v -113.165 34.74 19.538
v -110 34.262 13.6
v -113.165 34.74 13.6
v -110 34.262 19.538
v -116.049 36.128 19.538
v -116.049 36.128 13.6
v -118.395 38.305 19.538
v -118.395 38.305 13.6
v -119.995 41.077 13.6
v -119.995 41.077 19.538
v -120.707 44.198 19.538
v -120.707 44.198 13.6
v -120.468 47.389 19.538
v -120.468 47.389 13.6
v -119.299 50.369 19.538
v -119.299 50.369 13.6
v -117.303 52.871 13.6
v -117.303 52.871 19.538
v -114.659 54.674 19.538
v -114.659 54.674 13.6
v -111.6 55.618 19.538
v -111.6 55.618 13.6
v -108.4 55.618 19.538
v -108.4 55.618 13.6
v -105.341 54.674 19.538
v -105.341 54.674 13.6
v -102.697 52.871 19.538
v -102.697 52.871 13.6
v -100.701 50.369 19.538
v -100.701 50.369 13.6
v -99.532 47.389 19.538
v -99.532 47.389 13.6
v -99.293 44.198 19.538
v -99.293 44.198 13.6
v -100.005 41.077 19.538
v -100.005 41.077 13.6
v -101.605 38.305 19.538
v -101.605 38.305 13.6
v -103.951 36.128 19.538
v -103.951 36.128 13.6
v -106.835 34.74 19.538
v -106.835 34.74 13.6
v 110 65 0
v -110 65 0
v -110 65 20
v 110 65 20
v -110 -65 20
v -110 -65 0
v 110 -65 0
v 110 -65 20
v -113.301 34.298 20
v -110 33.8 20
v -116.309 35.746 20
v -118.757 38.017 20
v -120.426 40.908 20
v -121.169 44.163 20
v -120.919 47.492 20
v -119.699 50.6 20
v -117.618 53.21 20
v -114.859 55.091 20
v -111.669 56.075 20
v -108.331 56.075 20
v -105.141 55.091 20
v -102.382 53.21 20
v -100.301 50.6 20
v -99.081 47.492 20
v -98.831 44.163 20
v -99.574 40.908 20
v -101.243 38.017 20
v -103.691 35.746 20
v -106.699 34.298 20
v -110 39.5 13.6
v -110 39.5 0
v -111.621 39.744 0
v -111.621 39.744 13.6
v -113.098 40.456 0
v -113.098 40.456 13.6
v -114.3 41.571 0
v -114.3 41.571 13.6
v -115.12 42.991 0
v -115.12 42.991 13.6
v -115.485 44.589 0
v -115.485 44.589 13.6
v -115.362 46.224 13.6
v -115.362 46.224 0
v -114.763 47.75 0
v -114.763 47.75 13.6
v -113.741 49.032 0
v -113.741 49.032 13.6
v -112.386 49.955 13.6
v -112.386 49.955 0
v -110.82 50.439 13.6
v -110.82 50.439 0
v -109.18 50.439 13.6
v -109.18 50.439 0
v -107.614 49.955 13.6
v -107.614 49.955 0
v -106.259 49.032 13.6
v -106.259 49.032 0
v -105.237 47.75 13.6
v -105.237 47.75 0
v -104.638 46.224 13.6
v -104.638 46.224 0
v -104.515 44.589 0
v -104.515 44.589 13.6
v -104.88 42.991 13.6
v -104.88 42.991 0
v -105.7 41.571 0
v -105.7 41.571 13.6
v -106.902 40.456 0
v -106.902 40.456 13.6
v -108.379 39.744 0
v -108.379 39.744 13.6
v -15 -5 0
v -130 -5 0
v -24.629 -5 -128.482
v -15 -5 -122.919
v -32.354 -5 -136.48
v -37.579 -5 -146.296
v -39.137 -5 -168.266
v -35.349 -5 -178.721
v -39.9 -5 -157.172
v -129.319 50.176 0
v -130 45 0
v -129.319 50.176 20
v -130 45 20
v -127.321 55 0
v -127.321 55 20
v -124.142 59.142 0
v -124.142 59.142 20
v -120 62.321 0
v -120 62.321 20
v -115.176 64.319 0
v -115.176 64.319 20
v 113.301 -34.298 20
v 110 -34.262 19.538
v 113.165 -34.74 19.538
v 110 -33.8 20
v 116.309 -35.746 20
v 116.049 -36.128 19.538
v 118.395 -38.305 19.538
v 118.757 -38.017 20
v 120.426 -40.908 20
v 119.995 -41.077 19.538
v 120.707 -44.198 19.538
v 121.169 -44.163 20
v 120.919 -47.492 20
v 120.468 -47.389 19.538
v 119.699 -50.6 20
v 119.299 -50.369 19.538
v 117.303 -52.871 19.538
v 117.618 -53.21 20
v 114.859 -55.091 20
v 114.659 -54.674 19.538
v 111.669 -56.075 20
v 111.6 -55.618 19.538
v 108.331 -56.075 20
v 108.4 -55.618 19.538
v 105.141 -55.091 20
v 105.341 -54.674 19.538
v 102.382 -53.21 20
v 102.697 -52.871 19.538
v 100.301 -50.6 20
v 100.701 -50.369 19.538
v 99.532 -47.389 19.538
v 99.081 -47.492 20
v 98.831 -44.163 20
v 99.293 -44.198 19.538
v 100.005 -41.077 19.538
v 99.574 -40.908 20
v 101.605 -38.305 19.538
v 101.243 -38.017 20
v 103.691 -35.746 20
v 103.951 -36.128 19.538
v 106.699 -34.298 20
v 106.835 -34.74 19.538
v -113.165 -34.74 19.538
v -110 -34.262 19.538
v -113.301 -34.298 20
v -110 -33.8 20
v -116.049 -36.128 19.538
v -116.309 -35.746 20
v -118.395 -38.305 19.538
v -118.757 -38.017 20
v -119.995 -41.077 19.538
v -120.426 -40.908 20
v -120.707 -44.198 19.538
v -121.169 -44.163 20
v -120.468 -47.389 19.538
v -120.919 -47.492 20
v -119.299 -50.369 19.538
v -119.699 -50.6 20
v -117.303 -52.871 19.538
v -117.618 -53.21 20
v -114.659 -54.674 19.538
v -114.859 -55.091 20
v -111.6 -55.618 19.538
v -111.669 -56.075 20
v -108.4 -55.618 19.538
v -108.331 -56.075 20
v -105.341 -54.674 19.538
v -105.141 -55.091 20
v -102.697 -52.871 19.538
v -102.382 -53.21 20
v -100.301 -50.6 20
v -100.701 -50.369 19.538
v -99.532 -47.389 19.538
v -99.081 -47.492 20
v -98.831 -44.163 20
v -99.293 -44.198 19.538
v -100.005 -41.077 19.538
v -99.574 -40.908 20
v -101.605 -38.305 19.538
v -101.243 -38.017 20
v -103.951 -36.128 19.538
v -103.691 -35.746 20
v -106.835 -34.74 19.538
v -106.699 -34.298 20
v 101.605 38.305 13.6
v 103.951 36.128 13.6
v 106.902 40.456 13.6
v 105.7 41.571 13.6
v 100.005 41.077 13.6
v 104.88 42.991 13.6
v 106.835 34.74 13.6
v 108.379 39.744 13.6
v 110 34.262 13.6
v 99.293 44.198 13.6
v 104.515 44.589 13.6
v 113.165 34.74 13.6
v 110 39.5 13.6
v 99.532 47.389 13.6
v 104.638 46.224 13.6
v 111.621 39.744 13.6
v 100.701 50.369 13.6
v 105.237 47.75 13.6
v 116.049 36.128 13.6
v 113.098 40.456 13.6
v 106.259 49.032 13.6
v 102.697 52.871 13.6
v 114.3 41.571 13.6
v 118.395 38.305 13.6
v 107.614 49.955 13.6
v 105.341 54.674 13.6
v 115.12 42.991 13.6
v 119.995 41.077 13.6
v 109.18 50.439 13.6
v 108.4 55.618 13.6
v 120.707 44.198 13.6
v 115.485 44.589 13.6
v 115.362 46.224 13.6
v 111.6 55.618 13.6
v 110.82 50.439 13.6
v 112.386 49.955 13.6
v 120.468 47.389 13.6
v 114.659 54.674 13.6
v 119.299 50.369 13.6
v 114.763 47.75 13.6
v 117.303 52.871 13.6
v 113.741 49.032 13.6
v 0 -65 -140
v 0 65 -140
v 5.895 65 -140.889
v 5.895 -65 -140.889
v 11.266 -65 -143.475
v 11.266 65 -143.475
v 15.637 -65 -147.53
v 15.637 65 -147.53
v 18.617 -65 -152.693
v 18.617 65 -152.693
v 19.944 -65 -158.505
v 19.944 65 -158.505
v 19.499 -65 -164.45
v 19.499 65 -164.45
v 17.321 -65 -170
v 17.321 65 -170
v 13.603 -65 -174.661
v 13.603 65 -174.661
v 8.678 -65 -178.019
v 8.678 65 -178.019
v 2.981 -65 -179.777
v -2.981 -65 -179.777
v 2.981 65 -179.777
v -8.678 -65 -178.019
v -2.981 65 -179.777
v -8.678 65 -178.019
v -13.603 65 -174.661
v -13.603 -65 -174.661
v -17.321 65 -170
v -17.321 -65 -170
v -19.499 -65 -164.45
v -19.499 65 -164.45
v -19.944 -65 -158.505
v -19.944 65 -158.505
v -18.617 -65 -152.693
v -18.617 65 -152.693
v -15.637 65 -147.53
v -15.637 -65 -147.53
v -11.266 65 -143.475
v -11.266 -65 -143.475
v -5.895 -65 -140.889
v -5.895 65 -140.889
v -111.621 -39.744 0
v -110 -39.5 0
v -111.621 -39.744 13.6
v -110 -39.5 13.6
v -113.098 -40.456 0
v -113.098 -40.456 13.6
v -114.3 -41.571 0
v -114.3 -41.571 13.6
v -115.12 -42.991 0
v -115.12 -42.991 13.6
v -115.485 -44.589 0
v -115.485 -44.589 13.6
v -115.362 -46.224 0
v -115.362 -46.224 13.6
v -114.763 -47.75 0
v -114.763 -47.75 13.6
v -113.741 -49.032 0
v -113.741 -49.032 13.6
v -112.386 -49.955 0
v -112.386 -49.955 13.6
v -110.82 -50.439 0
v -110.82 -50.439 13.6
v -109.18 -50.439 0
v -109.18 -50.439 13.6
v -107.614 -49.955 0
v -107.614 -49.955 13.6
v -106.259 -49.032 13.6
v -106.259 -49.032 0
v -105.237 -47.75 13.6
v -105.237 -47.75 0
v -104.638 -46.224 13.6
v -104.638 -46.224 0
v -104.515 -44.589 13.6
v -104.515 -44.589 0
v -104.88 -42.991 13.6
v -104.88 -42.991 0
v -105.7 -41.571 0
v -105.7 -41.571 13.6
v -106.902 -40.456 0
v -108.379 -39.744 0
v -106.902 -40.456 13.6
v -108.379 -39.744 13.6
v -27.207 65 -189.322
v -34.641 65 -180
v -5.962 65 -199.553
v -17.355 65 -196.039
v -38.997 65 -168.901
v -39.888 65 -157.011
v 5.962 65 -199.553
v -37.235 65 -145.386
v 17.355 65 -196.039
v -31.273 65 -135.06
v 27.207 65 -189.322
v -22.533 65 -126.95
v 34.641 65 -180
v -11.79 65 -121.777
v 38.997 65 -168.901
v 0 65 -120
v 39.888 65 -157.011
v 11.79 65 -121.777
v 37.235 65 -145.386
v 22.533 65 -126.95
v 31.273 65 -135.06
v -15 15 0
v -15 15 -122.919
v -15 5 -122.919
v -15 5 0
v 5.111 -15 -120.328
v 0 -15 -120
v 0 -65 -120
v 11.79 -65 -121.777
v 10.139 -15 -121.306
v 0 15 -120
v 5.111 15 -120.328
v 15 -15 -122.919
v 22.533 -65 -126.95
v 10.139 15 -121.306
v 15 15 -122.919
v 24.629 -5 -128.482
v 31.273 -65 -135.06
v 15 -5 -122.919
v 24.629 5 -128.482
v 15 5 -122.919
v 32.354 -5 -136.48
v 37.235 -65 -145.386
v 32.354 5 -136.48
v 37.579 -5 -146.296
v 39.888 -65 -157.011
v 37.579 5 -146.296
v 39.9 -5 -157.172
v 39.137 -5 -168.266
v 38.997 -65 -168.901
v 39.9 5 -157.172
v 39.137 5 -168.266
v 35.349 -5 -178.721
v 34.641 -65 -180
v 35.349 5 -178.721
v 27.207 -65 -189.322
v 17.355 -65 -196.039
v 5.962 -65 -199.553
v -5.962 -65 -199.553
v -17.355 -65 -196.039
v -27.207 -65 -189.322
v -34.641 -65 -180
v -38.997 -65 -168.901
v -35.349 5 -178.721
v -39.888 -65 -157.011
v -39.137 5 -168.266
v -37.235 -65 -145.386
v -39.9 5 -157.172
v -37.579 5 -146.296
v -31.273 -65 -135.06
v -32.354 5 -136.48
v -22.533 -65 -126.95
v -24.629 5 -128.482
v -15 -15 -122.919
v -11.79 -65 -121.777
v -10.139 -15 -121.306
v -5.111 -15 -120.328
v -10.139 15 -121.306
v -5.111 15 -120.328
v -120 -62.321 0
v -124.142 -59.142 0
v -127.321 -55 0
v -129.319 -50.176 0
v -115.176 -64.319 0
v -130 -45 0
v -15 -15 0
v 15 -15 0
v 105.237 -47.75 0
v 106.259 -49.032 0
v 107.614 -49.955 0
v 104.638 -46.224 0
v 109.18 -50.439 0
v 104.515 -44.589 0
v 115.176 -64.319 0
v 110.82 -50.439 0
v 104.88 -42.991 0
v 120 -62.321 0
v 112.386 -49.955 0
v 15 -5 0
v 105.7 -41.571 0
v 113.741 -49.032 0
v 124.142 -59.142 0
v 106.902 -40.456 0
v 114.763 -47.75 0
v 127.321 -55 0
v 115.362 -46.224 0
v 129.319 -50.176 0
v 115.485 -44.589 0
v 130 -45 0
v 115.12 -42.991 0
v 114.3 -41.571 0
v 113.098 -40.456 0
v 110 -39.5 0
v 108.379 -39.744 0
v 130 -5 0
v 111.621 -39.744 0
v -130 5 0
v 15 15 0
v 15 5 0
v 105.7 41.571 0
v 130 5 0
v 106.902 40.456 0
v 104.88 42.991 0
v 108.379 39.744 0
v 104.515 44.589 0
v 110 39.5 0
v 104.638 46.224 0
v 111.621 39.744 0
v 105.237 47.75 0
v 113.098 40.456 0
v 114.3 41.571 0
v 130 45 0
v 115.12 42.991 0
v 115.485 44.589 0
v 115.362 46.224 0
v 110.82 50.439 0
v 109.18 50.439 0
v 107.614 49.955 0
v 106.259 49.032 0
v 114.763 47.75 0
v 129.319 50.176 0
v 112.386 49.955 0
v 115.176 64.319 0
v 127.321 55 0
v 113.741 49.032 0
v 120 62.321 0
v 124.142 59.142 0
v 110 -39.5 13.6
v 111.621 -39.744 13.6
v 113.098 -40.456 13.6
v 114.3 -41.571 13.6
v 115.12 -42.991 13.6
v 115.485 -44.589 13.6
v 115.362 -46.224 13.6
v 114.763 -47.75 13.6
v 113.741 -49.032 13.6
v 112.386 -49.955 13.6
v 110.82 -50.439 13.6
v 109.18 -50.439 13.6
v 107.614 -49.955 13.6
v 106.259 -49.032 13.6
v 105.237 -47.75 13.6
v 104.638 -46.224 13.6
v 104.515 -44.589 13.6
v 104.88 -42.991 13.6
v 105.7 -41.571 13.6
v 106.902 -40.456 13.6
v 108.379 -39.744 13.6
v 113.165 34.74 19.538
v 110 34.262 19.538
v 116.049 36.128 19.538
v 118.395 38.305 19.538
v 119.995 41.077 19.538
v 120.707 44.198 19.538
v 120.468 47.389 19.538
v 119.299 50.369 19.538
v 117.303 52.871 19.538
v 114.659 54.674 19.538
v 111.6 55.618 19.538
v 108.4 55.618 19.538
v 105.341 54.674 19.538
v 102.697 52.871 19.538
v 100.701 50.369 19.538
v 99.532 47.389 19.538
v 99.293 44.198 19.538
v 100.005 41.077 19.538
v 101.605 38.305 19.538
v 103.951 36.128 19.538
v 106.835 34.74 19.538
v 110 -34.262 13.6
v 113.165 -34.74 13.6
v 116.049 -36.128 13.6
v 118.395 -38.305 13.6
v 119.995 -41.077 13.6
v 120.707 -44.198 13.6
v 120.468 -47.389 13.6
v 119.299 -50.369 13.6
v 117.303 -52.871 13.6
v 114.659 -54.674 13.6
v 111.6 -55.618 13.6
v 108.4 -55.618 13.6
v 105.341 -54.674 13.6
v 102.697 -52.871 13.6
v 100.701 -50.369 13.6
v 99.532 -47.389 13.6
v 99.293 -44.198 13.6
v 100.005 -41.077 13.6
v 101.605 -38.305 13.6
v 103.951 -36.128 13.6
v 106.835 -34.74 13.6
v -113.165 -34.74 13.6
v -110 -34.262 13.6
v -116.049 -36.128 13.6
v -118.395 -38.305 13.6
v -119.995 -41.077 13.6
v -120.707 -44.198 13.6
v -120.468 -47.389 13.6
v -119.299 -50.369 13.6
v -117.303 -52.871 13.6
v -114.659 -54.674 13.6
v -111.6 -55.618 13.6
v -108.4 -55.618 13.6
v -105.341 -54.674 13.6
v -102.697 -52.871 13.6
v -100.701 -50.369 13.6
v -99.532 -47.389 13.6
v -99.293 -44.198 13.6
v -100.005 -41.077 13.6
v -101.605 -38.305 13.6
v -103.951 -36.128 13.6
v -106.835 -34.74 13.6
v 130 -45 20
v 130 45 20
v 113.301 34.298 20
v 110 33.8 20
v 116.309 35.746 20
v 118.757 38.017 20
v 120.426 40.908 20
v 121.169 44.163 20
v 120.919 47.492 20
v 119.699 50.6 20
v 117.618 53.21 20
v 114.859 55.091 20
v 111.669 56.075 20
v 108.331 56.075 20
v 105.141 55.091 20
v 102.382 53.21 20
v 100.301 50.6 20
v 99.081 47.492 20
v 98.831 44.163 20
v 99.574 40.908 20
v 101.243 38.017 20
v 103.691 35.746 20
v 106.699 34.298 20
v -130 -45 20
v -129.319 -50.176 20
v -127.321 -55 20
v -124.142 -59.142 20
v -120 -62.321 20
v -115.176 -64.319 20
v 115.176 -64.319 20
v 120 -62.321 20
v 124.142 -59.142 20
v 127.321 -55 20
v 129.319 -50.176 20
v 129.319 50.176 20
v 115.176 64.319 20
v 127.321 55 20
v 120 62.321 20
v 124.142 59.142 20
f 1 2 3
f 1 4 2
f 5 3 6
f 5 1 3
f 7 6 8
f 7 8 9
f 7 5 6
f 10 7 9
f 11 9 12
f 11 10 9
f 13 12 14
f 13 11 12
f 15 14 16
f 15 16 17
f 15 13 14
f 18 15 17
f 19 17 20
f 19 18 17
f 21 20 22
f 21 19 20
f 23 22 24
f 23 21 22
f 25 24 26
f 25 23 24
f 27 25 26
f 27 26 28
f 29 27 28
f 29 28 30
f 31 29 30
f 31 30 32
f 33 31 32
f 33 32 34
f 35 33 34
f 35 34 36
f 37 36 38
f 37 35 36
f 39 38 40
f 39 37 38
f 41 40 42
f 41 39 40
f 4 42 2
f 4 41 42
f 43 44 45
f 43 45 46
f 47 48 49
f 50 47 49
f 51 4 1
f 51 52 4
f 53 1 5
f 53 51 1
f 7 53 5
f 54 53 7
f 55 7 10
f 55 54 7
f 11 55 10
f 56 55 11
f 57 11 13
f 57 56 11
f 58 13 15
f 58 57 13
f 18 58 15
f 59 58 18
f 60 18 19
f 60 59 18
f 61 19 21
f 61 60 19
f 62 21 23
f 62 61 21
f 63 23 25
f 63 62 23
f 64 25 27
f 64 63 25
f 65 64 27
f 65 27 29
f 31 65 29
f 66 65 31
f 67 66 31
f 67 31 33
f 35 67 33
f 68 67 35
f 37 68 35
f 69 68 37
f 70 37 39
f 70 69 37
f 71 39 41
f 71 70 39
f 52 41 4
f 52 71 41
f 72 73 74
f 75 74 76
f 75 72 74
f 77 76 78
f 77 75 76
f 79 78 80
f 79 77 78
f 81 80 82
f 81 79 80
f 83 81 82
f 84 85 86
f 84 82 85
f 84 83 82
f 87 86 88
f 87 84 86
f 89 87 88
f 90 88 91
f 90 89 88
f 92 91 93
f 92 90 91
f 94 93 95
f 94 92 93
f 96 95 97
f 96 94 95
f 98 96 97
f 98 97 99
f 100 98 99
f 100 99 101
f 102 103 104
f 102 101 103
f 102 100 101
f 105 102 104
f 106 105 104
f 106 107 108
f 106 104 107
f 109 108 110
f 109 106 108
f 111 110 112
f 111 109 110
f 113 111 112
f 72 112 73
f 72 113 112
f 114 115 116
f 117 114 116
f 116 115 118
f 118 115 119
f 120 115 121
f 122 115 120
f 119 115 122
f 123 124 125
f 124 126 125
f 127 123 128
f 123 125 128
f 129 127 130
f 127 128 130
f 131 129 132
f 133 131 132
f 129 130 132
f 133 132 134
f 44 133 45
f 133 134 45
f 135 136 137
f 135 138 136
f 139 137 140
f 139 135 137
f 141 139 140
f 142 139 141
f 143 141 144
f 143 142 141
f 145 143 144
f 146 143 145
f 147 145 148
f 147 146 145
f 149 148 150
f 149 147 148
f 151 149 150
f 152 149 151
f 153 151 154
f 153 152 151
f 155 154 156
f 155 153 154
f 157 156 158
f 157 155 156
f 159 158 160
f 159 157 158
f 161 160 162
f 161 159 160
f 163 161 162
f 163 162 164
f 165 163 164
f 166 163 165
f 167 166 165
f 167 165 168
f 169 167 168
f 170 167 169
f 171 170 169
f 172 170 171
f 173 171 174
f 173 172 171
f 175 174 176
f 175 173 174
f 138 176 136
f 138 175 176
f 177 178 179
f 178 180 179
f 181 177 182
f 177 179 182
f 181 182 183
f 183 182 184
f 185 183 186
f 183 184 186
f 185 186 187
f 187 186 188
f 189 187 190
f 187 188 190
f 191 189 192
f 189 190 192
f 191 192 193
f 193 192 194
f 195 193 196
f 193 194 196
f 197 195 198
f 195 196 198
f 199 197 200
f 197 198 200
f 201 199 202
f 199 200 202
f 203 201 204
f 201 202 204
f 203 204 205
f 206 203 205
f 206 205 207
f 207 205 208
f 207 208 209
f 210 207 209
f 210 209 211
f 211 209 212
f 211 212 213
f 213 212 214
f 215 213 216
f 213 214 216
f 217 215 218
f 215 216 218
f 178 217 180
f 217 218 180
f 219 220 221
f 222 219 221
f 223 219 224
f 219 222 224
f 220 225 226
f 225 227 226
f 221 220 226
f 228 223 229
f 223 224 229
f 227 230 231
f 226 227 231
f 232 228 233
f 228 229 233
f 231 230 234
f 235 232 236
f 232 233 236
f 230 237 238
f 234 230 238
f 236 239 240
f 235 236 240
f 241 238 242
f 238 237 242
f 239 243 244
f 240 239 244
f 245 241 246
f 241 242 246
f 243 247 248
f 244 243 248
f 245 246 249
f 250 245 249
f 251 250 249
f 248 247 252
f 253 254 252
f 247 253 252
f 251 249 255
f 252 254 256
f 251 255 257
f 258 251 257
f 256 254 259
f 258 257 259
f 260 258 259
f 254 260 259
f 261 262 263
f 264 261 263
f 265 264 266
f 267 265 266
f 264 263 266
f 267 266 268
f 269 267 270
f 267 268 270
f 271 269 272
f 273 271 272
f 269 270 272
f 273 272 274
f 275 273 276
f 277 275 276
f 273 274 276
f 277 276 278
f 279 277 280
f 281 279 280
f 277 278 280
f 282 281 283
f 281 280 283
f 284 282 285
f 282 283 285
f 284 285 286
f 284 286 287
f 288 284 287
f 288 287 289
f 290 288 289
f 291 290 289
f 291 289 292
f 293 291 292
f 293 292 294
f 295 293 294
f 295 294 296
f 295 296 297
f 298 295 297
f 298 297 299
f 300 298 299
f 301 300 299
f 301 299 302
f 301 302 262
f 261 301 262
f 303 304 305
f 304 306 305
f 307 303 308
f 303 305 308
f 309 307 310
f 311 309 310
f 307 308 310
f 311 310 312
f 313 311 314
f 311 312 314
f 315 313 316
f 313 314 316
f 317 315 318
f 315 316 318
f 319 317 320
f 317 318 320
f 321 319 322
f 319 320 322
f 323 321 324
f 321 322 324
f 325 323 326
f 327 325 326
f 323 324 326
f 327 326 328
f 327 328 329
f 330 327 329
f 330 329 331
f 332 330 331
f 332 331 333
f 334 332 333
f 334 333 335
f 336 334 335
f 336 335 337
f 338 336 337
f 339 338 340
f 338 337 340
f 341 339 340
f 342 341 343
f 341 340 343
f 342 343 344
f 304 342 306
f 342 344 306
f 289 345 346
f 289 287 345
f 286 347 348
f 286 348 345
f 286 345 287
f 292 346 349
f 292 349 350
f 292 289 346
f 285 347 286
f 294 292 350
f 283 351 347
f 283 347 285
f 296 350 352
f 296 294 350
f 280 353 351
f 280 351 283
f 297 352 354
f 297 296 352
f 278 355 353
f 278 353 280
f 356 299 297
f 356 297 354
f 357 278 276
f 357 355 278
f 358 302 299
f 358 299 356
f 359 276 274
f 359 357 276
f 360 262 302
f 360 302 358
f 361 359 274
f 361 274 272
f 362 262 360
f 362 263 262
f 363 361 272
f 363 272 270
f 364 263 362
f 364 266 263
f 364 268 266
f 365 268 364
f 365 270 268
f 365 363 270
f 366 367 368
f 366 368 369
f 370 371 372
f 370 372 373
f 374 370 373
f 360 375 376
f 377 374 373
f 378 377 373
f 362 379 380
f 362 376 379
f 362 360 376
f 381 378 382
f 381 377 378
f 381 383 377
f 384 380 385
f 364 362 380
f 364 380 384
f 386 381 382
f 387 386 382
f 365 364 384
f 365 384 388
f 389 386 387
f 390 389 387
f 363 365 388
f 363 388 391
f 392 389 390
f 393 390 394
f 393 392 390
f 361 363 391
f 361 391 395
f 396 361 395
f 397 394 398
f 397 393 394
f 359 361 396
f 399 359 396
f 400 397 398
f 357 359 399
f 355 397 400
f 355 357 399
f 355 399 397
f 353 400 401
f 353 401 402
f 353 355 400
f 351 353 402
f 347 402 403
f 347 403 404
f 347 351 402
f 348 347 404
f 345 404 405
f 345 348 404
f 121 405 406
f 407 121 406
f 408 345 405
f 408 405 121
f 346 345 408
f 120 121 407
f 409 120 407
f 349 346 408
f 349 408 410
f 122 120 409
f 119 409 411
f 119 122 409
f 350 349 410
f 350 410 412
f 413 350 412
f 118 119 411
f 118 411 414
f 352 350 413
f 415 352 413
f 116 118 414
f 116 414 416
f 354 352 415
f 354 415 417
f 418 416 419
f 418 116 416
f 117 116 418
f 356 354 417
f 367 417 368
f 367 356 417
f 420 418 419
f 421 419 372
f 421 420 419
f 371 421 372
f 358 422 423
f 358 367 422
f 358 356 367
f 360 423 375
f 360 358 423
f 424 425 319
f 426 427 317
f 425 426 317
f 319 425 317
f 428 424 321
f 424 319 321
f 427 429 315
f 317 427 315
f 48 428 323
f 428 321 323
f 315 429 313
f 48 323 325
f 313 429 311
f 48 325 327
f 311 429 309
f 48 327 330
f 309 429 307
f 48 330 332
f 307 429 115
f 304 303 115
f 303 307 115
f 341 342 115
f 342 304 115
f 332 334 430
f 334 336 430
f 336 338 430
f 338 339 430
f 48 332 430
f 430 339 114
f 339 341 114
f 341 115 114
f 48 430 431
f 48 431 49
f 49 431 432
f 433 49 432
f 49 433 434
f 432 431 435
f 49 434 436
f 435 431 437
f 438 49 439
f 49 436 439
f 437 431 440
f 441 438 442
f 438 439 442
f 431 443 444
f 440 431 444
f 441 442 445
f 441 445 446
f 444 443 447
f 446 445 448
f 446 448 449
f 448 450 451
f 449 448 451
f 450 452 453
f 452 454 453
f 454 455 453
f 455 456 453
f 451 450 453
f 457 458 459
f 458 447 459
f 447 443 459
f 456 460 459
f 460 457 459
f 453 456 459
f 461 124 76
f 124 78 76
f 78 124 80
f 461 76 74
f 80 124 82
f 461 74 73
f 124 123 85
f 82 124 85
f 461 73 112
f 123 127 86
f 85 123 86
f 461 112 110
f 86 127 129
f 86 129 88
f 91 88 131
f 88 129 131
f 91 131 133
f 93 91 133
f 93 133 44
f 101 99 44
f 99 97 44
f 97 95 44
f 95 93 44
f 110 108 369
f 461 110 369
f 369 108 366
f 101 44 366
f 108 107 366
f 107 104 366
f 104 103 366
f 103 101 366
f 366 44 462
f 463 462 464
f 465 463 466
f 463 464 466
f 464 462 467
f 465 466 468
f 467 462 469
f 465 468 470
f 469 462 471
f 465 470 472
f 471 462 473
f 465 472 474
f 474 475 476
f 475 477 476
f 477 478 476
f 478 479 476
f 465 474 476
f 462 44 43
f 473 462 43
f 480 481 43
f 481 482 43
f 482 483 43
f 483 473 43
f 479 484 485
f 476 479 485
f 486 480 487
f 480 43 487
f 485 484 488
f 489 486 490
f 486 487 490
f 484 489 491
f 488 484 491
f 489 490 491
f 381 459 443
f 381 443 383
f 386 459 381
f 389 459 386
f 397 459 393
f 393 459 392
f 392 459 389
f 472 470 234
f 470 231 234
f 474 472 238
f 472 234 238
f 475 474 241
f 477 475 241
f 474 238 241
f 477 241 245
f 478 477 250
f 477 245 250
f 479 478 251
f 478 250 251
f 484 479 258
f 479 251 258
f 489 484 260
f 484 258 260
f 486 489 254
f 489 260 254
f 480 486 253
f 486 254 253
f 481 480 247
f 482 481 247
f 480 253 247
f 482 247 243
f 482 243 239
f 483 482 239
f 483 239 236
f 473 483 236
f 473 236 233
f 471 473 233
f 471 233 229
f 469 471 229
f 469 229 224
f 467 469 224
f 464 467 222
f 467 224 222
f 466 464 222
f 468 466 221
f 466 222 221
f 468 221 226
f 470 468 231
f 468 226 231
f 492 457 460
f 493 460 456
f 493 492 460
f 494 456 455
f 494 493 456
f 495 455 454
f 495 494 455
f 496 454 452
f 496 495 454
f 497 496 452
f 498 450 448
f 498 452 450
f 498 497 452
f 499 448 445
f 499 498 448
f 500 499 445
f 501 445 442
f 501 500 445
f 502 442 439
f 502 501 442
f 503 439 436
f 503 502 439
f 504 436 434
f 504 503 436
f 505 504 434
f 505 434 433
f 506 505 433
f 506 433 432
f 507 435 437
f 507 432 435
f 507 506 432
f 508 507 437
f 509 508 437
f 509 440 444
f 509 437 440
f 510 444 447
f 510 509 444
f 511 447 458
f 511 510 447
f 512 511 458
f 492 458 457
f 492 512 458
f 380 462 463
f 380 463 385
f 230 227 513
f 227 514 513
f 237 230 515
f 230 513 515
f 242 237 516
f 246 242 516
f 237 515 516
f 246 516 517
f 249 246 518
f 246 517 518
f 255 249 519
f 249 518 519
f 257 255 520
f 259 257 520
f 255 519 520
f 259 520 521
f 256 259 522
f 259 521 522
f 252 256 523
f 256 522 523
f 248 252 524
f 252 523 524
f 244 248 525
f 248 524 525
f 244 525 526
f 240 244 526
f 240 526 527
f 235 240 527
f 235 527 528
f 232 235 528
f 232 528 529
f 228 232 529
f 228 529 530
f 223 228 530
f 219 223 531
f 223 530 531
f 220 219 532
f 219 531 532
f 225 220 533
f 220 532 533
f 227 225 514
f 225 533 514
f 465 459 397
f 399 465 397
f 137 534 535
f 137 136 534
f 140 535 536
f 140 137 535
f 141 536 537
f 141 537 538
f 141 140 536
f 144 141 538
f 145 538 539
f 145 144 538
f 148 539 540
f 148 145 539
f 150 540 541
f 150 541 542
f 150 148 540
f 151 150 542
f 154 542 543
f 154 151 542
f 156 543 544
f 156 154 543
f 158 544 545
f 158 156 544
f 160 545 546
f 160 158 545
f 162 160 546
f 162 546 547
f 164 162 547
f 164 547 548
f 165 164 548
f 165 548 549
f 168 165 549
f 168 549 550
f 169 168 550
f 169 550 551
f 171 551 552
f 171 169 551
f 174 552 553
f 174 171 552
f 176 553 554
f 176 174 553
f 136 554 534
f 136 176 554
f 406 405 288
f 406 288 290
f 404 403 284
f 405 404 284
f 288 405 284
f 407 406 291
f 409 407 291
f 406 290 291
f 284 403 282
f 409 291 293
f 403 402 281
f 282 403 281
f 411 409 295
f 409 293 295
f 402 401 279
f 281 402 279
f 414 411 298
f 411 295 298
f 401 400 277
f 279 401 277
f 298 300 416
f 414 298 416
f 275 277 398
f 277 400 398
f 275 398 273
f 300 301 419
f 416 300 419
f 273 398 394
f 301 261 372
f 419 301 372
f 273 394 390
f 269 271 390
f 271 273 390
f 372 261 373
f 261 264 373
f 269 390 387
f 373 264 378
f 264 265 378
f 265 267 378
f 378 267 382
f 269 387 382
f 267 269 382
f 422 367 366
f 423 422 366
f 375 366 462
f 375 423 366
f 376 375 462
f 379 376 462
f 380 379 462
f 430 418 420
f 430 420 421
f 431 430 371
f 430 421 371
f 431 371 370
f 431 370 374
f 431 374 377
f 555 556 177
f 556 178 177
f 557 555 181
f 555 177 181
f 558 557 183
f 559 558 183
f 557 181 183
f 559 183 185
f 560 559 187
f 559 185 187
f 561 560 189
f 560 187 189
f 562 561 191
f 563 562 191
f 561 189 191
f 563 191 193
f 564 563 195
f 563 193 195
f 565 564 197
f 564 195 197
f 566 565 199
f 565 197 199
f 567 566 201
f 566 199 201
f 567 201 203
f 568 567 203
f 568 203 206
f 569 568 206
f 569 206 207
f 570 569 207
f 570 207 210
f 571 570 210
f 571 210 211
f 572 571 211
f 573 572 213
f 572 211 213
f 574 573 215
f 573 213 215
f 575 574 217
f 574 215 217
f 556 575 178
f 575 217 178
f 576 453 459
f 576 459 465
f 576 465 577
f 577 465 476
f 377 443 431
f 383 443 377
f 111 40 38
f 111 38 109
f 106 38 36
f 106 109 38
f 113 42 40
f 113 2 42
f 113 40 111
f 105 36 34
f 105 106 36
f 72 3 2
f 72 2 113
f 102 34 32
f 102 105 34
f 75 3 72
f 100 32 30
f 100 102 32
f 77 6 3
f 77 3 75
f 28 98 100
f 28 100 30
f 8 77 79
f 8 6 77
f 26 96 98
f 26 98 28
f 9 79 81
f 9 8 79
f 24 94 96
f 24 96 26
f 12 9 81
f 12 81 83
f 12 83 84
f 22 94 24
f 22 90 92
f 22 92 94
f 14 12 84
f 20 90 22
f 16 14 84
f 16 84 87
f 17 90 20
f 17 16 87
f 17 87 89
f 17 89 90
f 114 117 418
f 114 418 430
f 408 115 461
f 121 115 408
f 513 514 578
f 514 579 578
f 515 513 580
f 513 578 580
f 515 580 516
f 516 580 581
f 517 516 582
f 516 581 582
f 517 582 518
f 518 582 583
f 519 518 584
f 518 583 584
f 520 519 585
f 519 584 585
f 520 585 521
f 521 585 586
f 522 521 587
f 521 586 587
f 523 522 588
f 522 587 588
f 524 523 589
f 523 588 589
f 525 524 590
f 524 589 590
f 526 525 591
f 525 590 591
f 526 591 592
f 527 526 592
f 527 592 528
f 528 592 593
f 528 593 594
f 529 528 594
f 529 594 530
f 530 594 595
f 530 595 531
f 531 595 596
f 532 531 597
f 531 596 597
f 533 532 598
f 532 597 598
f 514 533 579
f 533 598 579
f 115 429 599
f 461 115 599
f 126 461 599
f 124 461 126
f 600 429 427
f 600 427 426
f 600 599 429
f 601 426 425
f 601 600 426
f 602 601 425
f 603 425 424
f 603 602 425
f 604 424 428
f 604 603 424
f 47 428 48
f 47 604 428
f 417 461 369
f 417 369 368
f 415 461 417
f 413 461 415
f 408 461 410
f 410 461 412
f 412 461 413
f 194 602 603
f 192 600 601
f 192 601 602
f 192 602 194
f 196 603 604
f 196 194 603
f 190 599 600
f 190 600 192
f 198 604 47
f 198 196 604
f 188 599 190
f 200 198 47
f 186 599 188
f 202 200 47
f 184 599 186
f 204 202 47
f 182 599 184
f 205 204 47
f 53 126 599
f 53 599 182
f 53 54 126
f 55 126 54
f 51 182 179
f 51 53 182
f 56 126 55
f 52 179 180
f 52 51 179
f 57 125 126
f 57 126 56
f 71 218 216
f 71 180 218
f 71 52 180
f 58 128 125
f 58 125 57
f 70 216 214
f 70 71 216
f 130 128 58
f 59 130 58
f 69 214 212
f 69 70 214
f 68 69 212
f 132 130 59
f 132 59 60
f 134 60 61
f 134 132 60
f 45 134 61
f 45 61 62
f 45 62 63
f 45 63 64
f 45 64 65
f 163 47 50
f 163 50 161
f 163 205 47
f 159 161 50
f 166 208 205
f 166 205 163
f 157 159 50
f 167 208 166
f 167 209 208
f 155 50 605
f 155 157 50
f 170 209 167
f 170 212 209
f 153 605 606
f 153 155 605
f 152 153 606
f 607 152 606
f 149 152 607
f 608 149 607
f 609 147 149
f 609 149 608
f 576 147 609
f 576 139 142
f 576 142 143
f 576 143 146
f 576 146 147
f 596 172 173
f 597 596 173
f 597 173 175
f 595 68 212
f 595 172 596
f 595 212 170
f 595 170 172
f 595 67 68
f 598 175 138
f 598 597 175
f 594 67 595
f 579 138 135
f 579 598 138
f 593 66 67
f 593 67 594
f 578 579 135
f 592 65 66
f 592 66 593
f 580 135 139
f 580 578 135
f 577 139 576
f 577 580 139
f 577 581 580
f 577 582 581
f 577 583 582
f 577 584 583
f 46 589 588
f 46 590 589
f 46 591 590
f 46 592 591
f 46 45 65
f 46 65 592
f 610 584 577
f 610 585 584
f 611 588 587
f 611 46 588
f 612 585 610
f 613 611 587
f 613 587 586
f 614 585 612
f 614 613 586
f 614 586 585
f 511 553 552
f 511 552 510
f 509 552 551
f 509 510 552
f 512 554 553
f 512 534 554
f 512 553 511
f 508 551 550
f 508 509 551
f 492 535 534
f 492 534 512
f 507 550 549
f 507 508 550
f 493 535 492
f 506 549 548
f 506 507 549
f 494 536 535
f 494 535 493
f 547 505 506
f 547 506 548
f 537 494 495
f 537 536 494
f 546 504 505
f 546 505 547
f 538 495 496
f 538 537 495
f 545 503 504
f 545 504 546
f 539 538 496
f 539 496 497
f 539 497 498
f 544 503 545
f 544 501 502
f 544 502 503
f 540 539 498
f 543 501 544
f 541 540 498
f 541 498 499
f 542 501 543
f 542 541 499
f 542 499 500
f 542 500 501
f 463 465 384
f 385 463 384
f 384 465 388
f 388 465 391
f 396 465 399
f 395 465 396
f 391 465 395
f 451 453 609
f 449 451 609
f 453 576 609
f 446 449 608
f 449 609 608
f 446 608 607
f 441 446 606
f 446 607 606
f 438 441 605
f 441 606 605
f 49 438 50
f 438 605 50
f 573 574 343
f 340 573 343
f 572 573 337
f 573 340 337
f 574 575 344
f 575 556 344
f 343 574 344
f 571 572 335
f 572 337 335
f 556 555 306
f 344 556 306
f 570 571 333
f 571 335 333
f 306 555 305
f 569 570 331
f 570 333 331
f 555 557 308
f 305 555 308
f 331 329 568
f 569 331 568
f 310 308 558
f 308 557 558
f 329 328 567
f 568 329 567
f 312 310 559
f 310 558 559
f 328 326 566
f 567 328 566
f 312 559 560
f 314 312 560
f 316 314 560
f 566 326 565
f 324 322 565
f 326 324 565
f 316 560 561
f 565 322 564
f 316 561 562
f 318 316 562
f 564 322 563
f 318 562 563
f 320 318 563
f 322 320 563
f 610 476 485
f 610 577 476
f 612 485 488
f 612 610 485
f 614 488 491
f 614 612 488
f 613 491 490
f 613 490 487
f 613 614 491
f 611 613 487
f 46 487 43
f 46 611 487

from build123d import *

# Parameters (mm, degrees)
SKETCH_1_W          = 260
SKETCH_1_H          = 130
EXTRUDE_1_DEPTH     = 20
SKETCH_4_R          = 40
EXTRUDE_2_DEPTH     = 65
EXTRUDE_3_DEPTH     = 15
RIB_4_REACH         = 249.235
SKETCH_6_WALL_W     = 698.706896764
SKETCH_6_WALL_H     = 10
SKETCH_7_R          = 20
CUT_EXTRUDE_1_DEPTH = 272.661554144
FILLET_1_R          = 20


with BuildPart() as part:
    # 草图1 → 凸台-拉伸1 (new body)
    with BuildSketch(Plane.XY):
        Rectangle(SKETCH_1_W, SKETCH_1_H)
    extrude(amount=EXTRUDE_1_DEPTH)

    # 草图3 → M10 六角头螺栓的柱形沉头孔1 (revolve, cut)
    with BuildSketch(Plane(origin=(-110, 45, 20), x_dir=(0, -1, 0), z_dir=(1, 0, 0))):
        Polygon((0, 0), (0, 30.804733405), (5.5, 27.5), (5.5, 6.4), (10.7375, 6.4), (10.7375, 0.4625), (11.2, 0), align=None)
    hole_wizard_m10_1 = revolve(axis=Axis((-110, 45, 26.35), (0, 0, -1)), mode=Mode.SUBTRACT)

    # 镜向1: M10 六角头螺栓的柱形沉头孔1 across plane
    add(hole_wizard_m10_1.mirror(Plane.ZX), mode=Mode.SUBTRACT)

    # 镜向2: M10 六角头螺栓的柱形沉头孔1 across plane
    add(hole_wizard_m10_1.mirror(Plane(origin=(0, 0, 0), x_dir=(0, 0, 1), z_dir=(1, 0, 0))), mode=Mode.SUBTRACT)

    # 镜向2 copy 1 sketch → 镜向2 copy 1 (revolve, cut)
    with BuildSketch(Plane(origin=(110, -45, 20), x_dir=(0, 1, 0), z_dir=(-1, 0, 0))):
        Polygon((0, 0), (0, 30.804733405), (5.5, 27.5), (5.5, 6.4), (10.7375, 6.4), (10.7375, 0.4625), (11.2, 0), align=None)
    revolve(axis=Axis((110, -45, 26.35), (0, 0, -1)), mode=Mode.SUBTRACT)



with BuildPart() as body_2:
    # 草图4 → 凸台-拉伸2 (new, symmetric)
    with BuildSketch(Plane(origin=(0, 0, 0), x_dir=(1, 0, 0), z_dir=(0, 1, 0))):
        with Locations(Location((0, 160, 0), (0, 0, 270))):
            Circle(SKETCH_4_R)
    extrude(amount=EXTRUDE_2_DEPTH, both=True)


with BuildPart() as part_1:
    add(part.part)

    add(body_2.part)  # 凸台-拉伸3 merges body 2
    # 草图5 → 凸台-拉伸3 (add, symmetric)
    with BuildSketch(Plane(origin=(0, 0, 0), x_dir=(1, 0, 0), z_dir=(0, 1, 0))):
        with BuildLine():
            Line((-15, 122.919007565), (-15, 0))
            Line((-15, 0), (15, 0))
            Line((15, 0), (15, 122.919007565))
            ThreePointArc((15, 122.919007565), (0, 120), (-15, 122.919007565))
        make_face()
    extrude(amount=EXTRUDE_3_DEPTH, both=True)

    # 草图6 wall → 筋4 (add, up to next)
    with BuildSketch(Plane(origin=(82.674351749, 0, -89.360410796), x_dir=(-0.468020539788, 0, -0.883717587432), z_dir=(-0.883717587432, 0, 0.468020539788)), mode=Mode.PRIVATE) as rib_4_sk1:
        Rectangle(SKETCH_6_WALL_W, SKETCH_6_WALL_H)
    rib_4_tool1 = extrude(rib_4_sk1.sketch, amount=RIB_4_REACH, mode=Mode.PRIVATE) - part_1.part
    rib_4 = rib_4_tool1.solids().sort_by_distance((82.674351749, 0, -89.360410796))[0]
    add(rib_4)

    # 镜向3: 筋4 across plane
    add(rib_4.mirror(Plane(origin=(0, 0, 0), x_dir=(0, 0, 1), z_dir=(1, 0, 0))))

    # 草图7 → 切除-拉伸1 (cut, through all)
    with BuildSketch(Plane(origin=(0, 65, 0), x_dir=(1, 0, 0), z_dir=(0, 1, 0))):
        with Locations(Location((0, 160, 0), (0, 0, 270))):
            Circle(SKETCH_7_R)
    extrude(amount=-CUT_EXTRUDE_1_DEPTH, mode=Mode.SUBTRACT)

    # 圆角1
    fillet_1_edges = [part_1.edges().sort_by_distance(p)[0] for p in [
        (-130, 65, 10),
        (130, 65, 10),
        (130, -65, 10),
        (-130, -65, 10),
    ]]
    fillet(fillet_1_edges, radius=FILLET_1_R)


solid = part_1.part
